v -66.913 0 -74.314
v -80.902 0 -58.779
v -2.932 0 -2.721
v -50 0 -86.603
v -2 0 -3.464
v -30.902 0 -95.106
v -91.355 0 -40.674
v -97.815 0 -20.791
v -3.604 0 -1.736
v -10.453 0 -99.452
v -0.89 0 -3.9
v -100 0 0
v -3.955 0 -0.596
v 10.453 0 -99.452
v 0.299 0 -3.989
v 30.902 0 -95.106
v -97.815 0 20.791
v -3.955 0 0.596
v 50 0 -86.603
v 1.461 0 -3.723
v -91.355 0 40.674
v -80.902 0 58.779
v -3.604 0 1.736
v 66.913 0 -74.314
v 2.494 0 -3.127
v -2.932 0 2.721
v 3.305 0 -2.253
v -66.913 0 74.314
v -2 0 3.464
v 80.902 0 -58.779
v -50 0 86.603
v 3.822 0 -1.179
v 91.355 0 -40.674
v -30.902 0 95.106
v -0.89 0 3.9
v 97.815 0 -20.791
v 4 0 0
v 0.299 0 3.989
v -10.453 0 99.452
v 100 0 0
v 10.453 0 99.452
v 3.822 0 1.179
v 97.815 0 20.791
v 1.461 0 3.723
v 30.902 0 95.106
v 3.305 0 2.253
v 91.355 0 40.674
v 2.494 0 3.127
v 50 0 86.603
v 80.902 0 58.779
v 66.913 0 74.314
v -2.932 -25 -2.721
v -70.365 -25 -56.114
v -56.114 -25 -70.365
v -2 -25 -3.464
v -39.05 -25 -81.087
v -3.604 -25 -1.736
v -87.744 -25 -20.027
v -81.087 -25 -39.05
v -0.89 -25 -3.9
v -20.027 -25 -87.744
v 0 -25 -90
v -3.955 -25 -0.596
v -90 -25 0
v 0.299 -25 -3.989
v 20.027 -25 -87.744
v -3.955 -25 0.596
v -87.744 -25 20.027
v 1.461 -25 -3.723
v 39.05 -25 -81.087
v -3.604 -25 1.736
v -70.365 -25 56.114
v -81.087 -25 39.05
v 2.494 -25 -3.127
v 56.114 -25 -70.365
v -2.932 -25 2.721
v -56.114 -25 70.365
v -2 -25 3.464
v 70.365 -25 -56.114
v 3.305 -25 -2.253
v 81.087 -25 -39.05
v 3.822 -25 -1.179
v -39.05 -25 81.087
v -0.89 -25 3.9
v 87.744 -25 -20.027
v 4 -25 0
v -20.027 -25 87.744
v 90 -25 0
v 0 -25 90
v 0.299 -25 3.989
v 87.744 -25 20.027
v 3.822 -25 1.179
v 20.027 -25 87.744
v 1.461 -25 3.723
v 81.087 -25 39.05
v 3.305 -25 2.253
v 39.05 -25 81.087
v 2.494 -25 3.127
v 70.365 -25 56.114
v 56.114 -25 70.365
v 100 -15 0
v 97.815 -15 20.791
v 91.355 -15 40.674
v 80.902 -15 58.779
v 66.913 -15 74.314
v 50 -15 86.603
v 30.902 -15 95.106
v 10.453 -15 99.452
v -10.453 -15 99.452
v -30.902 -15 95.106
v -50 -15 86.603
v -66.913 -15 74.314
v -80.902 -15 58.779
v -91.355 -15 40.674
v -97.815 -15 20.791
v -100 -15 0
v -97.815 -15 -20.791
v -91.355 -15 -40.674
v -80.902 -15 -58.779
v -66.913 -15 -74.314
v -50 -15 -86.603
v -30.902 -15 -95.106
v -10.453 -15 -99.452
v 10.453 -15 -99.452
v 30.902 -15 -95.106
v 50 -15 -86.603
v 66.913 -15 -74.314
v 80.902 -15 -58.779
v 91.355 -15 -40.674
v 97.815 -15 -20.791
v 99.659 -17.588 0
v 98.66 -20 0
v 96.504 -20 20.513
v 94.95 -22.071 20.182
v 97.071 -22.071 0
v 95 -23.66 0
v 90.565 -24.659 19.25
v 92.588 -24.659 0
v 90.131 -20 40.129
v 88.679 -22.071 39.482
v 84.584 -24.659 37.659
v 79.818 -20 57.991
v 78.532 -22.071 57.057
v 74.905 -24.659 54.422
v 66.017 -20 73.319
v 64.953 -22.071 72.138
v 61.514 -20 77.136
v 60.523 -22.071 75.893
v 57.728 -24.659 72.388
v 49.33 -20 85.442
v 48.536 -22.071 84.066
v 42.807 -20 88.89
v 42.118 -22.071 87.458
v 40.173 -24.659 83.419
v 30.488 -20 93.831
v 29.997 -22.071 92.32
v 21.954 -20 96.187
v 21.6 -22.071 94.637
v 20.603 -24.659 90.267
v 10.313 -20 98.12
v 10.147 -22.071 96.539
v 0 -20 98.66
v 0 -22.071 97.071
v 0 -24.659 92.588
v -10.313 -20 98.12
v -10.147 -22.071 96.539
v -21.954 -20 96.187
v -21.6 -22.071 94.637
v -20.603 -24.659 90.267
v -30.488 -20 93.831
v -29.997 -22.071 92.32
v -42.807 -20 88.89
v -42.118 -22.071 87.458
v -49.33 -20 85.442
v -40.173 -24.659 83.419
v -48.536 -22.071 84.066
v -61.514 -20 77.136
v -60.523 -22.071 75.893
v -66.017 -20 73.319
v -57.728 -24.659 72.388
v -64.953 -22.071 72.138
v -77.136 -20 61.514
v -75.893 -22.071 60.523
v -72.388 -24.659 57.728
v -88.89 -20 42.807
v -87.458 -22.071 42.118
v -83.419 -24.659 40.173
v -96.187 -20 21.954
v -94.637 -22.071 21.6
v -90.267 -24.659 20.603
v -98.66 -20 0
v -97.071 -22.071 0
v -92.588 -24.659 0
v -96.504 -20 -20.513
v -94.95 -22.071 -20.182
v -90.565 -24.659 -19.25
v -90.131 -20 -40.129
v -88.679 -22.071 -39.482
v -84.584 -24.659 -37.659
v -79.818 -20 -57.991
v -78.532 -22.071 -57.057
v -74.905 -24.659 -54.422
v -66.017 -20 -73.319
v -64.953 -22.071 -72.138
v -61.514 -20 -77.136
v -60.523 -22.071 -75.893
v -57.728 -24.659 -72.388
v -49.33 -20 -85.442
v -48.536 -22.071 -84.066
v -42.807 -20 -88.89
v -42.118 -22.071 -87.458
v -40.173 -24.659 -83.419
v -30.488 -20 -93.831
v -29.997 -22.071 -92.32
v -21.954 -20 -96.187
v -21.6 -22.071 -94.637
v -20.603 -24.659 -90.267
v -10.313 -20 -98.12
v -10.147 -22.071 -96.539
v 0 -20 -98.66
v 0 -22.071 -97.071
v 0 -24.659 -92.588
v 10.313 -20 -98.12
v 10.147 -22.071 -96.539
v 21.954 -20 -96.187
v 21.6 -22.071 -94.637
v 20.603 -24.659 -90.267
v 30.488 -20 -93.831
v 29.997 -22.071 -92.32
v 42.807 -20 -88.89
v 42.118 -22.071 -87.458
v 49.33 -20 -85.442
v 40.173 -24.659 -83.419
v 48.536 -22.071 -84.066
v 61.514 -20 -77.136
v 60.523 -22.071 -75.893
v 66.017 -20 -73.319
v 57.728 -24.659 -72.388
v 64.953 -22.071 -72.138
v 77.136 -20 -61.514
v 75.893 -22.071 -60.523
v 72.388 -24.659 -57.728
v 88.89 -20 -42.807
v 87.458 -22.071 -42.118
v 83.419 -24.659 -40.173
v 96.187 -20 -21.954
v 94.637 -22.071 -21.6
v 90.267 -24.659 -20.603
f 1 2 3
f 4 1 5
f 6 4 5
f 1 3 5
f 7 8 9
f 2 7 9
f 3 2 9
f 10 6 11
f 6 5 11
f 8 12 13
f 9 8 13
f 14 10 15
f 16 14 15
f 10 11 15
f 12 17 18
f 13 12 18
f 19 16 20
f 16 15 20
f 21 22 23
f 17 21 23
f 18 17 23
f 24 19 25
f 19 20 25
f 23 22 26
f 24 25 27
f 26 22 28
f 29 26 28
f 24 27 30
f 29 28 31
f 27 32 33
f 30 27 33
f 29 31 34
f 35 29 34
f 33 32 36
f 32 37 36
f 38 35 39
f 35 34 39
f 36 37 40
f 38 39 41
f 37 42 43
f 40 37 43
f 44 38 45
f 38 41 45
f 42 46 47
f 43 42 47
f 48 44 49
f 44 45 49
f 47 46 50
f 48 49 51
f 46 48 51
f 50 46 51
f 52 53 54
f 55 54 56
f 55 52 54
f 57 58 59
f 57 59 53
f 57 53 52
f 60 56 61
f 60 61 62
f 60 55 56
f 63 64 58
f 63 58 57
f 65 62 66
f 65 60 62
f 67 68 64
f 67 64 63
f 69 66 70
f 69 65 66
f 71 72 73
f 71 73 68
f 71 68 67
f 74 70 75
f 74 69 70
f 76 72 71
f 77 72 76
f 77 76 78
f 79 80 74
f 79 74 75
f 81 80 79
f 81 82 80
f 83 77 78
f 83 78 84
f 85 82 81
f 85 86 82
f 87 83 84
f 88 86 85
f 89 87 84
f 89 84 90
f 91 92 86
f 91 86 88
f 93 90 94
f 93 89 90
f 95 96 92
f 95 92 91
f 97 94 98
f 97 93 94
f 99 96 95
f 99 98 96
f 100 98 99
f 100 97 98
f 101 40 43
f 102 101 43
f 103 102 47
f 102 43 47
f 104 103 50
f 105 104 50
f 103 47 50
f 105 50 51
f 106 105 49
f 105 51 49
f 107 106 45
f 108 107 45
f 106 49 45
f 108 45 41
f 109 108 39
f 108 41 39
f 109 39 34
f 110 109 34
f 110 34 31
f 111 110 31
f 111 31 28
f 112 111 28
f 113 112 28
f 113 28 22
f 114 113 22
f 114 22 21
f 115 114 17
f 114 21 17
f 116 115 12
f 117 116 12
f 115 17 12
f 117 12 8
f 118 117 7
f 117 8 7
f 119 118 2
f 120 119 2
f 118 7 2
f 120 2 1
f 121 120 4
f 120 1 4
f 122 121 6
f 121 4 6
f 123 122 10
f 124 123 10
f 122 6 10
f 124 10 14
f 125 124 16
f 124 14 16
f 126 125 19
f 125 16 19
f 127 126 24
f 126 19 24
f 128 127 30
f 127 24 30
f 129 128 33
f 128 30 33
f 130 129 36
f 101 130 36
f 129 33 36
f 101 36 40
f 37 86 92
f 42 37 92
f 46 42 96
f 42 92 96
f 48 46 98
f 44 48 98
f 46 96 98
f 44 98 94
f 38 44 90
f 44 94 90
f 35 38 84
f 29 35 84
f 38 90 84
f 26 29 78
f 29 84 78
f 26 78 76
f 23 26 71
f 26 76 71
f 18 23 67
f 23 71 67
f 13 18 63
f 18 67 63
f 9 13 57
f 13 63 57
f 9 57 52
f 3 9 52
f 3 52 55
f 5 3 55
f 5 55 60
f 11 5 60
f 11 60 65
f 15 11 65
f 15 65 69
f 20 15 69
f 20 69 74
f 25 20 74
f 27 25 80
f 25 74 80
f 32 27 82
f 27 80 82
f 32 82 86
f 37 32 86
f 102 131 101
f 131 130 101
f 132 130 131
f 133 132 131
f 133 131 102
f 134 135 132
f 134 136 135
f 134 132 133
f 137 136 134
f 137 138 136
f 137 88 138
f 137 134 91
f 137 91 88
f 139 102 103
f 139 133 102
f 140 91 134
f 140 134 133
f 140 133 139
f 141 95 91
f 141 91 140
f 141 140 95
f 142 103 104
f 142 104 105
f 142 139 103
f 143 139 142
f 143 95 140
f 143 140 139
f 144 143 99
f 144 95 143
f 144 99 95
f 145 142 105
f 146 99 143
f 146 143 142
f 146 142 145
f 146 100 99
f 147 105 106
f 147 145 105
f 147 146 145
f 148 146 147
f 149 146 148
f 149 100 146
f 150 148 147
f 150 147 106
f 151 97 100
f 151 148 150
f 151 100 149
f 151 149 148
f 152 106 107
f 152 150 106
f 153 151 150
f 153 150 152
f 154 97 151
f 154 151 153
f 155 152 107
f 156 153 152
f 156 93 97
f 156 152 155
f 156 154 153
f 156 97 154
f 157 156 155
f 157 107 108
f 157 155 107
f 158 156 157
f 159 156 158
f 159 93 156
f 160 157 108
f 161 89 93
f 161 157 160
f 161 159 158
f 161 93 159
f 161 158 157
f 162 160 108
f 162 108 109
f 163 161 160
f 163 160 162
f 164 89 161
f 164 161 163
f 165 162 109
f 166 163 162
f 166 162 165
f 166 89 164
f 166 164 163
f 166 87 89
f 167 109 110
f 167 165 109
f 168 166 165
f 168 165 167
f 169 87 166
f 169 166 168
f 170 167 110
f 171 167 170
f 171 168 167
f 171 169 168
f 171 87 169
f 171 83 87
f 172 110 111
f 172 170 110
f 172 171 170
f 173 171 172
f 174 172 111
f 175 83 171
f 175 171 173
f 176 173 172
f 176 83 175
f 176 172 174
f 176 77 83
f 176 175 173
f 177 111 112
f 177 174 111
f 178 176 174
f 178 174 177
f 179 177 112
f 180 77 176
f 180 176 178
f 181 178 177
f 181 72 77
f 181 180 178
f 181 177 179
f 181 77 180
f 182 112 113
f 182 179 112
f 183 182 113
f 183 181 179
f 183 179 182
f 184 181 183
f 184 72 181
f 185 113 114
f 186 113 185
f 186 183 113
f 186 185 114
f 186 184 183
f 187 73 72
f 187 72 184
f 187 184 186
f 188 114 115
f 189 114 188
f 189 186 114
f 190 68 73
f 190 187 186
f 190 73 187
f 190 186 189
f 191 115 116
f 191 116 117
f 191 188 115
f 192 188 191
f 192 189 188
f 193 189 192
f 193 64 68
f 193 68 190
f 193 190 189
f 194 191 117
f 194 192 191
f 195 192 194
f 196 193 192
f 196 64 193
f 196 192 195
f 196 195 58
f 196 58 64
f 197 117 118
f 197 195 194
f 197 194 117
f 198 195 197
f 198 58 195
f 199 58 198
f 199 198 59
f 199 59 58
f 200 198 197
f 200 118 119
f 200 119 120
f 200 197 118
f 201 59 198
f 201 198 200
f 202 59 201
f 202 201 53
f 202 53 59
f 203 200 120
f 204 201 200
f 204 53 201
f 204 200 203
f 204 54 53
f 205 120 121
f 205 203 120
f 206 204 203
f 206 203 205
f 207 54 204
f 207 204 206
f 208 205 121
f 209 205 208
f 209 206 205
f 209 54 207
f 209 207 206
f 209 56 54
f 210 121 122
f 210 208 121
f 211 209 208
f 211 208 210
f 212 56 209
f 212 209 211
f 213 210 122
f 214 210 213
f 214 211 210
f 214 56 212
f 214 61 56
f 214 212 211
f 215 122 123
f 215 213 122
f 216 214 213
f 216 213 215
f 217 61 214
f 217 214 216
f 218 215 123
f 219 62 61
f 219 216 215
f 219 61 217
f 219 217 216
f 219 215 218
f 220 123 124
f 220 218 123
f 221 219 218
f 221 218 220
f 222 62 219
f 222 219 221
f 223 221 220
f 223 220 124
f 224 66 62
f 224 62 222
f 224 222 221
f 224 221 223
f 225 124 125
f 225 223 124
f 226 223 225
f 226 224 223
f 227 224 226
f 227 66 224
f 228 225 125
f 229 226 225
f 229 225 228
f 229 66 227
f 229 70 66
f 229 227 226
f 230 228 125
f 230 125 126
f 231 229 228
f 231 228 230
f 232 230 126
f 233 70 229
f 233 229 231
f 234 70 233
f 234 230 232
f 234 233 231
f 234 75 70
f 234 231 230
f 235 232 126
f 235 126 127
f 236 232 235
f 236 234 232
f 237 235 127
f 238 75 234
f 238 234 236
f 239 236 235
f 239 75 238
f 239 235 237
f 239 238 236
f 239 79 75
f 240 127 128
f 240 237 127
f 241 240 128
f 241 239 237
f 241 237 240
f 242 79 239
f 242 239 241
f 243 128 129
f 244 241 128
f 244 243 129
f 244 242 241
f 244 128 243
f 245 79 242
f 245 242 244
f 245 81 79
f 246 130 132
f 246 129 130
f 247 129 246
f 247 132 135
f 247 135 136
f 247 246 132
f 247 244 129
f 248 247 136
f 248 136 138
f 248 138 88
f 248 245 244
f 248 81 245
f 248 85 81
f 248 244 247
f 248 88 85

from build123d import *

# Parameters (mm, degrees)
F0_R     = 100
F1_DEPTH = 25
F2_R     = 10
F3_R     = 4
F4_DEPTH = 25


with BuildPart() as f1:
    # F0 (on Front) → F1 (new body)
    with BuildSketch(Plane.XZ):
        Circle(F0_R)
    extrude(amount=F1_DEPTH)

    # F2
    f2_edges = [f1.edges().sort_by_distance(p)[0] for p in [
        (-100, -25, 0),
    ]]
    fillet(f2_edges, radius=F2_R)

    # F3 (on face) → F4 (cut)
    with BuildSketch(Plane.XZ.offset(25)):
        Circle(F3_R)
    extrude(amount=-F4_DEPTH, mode=Mode.SUBTRACT)


solid = f1.part
